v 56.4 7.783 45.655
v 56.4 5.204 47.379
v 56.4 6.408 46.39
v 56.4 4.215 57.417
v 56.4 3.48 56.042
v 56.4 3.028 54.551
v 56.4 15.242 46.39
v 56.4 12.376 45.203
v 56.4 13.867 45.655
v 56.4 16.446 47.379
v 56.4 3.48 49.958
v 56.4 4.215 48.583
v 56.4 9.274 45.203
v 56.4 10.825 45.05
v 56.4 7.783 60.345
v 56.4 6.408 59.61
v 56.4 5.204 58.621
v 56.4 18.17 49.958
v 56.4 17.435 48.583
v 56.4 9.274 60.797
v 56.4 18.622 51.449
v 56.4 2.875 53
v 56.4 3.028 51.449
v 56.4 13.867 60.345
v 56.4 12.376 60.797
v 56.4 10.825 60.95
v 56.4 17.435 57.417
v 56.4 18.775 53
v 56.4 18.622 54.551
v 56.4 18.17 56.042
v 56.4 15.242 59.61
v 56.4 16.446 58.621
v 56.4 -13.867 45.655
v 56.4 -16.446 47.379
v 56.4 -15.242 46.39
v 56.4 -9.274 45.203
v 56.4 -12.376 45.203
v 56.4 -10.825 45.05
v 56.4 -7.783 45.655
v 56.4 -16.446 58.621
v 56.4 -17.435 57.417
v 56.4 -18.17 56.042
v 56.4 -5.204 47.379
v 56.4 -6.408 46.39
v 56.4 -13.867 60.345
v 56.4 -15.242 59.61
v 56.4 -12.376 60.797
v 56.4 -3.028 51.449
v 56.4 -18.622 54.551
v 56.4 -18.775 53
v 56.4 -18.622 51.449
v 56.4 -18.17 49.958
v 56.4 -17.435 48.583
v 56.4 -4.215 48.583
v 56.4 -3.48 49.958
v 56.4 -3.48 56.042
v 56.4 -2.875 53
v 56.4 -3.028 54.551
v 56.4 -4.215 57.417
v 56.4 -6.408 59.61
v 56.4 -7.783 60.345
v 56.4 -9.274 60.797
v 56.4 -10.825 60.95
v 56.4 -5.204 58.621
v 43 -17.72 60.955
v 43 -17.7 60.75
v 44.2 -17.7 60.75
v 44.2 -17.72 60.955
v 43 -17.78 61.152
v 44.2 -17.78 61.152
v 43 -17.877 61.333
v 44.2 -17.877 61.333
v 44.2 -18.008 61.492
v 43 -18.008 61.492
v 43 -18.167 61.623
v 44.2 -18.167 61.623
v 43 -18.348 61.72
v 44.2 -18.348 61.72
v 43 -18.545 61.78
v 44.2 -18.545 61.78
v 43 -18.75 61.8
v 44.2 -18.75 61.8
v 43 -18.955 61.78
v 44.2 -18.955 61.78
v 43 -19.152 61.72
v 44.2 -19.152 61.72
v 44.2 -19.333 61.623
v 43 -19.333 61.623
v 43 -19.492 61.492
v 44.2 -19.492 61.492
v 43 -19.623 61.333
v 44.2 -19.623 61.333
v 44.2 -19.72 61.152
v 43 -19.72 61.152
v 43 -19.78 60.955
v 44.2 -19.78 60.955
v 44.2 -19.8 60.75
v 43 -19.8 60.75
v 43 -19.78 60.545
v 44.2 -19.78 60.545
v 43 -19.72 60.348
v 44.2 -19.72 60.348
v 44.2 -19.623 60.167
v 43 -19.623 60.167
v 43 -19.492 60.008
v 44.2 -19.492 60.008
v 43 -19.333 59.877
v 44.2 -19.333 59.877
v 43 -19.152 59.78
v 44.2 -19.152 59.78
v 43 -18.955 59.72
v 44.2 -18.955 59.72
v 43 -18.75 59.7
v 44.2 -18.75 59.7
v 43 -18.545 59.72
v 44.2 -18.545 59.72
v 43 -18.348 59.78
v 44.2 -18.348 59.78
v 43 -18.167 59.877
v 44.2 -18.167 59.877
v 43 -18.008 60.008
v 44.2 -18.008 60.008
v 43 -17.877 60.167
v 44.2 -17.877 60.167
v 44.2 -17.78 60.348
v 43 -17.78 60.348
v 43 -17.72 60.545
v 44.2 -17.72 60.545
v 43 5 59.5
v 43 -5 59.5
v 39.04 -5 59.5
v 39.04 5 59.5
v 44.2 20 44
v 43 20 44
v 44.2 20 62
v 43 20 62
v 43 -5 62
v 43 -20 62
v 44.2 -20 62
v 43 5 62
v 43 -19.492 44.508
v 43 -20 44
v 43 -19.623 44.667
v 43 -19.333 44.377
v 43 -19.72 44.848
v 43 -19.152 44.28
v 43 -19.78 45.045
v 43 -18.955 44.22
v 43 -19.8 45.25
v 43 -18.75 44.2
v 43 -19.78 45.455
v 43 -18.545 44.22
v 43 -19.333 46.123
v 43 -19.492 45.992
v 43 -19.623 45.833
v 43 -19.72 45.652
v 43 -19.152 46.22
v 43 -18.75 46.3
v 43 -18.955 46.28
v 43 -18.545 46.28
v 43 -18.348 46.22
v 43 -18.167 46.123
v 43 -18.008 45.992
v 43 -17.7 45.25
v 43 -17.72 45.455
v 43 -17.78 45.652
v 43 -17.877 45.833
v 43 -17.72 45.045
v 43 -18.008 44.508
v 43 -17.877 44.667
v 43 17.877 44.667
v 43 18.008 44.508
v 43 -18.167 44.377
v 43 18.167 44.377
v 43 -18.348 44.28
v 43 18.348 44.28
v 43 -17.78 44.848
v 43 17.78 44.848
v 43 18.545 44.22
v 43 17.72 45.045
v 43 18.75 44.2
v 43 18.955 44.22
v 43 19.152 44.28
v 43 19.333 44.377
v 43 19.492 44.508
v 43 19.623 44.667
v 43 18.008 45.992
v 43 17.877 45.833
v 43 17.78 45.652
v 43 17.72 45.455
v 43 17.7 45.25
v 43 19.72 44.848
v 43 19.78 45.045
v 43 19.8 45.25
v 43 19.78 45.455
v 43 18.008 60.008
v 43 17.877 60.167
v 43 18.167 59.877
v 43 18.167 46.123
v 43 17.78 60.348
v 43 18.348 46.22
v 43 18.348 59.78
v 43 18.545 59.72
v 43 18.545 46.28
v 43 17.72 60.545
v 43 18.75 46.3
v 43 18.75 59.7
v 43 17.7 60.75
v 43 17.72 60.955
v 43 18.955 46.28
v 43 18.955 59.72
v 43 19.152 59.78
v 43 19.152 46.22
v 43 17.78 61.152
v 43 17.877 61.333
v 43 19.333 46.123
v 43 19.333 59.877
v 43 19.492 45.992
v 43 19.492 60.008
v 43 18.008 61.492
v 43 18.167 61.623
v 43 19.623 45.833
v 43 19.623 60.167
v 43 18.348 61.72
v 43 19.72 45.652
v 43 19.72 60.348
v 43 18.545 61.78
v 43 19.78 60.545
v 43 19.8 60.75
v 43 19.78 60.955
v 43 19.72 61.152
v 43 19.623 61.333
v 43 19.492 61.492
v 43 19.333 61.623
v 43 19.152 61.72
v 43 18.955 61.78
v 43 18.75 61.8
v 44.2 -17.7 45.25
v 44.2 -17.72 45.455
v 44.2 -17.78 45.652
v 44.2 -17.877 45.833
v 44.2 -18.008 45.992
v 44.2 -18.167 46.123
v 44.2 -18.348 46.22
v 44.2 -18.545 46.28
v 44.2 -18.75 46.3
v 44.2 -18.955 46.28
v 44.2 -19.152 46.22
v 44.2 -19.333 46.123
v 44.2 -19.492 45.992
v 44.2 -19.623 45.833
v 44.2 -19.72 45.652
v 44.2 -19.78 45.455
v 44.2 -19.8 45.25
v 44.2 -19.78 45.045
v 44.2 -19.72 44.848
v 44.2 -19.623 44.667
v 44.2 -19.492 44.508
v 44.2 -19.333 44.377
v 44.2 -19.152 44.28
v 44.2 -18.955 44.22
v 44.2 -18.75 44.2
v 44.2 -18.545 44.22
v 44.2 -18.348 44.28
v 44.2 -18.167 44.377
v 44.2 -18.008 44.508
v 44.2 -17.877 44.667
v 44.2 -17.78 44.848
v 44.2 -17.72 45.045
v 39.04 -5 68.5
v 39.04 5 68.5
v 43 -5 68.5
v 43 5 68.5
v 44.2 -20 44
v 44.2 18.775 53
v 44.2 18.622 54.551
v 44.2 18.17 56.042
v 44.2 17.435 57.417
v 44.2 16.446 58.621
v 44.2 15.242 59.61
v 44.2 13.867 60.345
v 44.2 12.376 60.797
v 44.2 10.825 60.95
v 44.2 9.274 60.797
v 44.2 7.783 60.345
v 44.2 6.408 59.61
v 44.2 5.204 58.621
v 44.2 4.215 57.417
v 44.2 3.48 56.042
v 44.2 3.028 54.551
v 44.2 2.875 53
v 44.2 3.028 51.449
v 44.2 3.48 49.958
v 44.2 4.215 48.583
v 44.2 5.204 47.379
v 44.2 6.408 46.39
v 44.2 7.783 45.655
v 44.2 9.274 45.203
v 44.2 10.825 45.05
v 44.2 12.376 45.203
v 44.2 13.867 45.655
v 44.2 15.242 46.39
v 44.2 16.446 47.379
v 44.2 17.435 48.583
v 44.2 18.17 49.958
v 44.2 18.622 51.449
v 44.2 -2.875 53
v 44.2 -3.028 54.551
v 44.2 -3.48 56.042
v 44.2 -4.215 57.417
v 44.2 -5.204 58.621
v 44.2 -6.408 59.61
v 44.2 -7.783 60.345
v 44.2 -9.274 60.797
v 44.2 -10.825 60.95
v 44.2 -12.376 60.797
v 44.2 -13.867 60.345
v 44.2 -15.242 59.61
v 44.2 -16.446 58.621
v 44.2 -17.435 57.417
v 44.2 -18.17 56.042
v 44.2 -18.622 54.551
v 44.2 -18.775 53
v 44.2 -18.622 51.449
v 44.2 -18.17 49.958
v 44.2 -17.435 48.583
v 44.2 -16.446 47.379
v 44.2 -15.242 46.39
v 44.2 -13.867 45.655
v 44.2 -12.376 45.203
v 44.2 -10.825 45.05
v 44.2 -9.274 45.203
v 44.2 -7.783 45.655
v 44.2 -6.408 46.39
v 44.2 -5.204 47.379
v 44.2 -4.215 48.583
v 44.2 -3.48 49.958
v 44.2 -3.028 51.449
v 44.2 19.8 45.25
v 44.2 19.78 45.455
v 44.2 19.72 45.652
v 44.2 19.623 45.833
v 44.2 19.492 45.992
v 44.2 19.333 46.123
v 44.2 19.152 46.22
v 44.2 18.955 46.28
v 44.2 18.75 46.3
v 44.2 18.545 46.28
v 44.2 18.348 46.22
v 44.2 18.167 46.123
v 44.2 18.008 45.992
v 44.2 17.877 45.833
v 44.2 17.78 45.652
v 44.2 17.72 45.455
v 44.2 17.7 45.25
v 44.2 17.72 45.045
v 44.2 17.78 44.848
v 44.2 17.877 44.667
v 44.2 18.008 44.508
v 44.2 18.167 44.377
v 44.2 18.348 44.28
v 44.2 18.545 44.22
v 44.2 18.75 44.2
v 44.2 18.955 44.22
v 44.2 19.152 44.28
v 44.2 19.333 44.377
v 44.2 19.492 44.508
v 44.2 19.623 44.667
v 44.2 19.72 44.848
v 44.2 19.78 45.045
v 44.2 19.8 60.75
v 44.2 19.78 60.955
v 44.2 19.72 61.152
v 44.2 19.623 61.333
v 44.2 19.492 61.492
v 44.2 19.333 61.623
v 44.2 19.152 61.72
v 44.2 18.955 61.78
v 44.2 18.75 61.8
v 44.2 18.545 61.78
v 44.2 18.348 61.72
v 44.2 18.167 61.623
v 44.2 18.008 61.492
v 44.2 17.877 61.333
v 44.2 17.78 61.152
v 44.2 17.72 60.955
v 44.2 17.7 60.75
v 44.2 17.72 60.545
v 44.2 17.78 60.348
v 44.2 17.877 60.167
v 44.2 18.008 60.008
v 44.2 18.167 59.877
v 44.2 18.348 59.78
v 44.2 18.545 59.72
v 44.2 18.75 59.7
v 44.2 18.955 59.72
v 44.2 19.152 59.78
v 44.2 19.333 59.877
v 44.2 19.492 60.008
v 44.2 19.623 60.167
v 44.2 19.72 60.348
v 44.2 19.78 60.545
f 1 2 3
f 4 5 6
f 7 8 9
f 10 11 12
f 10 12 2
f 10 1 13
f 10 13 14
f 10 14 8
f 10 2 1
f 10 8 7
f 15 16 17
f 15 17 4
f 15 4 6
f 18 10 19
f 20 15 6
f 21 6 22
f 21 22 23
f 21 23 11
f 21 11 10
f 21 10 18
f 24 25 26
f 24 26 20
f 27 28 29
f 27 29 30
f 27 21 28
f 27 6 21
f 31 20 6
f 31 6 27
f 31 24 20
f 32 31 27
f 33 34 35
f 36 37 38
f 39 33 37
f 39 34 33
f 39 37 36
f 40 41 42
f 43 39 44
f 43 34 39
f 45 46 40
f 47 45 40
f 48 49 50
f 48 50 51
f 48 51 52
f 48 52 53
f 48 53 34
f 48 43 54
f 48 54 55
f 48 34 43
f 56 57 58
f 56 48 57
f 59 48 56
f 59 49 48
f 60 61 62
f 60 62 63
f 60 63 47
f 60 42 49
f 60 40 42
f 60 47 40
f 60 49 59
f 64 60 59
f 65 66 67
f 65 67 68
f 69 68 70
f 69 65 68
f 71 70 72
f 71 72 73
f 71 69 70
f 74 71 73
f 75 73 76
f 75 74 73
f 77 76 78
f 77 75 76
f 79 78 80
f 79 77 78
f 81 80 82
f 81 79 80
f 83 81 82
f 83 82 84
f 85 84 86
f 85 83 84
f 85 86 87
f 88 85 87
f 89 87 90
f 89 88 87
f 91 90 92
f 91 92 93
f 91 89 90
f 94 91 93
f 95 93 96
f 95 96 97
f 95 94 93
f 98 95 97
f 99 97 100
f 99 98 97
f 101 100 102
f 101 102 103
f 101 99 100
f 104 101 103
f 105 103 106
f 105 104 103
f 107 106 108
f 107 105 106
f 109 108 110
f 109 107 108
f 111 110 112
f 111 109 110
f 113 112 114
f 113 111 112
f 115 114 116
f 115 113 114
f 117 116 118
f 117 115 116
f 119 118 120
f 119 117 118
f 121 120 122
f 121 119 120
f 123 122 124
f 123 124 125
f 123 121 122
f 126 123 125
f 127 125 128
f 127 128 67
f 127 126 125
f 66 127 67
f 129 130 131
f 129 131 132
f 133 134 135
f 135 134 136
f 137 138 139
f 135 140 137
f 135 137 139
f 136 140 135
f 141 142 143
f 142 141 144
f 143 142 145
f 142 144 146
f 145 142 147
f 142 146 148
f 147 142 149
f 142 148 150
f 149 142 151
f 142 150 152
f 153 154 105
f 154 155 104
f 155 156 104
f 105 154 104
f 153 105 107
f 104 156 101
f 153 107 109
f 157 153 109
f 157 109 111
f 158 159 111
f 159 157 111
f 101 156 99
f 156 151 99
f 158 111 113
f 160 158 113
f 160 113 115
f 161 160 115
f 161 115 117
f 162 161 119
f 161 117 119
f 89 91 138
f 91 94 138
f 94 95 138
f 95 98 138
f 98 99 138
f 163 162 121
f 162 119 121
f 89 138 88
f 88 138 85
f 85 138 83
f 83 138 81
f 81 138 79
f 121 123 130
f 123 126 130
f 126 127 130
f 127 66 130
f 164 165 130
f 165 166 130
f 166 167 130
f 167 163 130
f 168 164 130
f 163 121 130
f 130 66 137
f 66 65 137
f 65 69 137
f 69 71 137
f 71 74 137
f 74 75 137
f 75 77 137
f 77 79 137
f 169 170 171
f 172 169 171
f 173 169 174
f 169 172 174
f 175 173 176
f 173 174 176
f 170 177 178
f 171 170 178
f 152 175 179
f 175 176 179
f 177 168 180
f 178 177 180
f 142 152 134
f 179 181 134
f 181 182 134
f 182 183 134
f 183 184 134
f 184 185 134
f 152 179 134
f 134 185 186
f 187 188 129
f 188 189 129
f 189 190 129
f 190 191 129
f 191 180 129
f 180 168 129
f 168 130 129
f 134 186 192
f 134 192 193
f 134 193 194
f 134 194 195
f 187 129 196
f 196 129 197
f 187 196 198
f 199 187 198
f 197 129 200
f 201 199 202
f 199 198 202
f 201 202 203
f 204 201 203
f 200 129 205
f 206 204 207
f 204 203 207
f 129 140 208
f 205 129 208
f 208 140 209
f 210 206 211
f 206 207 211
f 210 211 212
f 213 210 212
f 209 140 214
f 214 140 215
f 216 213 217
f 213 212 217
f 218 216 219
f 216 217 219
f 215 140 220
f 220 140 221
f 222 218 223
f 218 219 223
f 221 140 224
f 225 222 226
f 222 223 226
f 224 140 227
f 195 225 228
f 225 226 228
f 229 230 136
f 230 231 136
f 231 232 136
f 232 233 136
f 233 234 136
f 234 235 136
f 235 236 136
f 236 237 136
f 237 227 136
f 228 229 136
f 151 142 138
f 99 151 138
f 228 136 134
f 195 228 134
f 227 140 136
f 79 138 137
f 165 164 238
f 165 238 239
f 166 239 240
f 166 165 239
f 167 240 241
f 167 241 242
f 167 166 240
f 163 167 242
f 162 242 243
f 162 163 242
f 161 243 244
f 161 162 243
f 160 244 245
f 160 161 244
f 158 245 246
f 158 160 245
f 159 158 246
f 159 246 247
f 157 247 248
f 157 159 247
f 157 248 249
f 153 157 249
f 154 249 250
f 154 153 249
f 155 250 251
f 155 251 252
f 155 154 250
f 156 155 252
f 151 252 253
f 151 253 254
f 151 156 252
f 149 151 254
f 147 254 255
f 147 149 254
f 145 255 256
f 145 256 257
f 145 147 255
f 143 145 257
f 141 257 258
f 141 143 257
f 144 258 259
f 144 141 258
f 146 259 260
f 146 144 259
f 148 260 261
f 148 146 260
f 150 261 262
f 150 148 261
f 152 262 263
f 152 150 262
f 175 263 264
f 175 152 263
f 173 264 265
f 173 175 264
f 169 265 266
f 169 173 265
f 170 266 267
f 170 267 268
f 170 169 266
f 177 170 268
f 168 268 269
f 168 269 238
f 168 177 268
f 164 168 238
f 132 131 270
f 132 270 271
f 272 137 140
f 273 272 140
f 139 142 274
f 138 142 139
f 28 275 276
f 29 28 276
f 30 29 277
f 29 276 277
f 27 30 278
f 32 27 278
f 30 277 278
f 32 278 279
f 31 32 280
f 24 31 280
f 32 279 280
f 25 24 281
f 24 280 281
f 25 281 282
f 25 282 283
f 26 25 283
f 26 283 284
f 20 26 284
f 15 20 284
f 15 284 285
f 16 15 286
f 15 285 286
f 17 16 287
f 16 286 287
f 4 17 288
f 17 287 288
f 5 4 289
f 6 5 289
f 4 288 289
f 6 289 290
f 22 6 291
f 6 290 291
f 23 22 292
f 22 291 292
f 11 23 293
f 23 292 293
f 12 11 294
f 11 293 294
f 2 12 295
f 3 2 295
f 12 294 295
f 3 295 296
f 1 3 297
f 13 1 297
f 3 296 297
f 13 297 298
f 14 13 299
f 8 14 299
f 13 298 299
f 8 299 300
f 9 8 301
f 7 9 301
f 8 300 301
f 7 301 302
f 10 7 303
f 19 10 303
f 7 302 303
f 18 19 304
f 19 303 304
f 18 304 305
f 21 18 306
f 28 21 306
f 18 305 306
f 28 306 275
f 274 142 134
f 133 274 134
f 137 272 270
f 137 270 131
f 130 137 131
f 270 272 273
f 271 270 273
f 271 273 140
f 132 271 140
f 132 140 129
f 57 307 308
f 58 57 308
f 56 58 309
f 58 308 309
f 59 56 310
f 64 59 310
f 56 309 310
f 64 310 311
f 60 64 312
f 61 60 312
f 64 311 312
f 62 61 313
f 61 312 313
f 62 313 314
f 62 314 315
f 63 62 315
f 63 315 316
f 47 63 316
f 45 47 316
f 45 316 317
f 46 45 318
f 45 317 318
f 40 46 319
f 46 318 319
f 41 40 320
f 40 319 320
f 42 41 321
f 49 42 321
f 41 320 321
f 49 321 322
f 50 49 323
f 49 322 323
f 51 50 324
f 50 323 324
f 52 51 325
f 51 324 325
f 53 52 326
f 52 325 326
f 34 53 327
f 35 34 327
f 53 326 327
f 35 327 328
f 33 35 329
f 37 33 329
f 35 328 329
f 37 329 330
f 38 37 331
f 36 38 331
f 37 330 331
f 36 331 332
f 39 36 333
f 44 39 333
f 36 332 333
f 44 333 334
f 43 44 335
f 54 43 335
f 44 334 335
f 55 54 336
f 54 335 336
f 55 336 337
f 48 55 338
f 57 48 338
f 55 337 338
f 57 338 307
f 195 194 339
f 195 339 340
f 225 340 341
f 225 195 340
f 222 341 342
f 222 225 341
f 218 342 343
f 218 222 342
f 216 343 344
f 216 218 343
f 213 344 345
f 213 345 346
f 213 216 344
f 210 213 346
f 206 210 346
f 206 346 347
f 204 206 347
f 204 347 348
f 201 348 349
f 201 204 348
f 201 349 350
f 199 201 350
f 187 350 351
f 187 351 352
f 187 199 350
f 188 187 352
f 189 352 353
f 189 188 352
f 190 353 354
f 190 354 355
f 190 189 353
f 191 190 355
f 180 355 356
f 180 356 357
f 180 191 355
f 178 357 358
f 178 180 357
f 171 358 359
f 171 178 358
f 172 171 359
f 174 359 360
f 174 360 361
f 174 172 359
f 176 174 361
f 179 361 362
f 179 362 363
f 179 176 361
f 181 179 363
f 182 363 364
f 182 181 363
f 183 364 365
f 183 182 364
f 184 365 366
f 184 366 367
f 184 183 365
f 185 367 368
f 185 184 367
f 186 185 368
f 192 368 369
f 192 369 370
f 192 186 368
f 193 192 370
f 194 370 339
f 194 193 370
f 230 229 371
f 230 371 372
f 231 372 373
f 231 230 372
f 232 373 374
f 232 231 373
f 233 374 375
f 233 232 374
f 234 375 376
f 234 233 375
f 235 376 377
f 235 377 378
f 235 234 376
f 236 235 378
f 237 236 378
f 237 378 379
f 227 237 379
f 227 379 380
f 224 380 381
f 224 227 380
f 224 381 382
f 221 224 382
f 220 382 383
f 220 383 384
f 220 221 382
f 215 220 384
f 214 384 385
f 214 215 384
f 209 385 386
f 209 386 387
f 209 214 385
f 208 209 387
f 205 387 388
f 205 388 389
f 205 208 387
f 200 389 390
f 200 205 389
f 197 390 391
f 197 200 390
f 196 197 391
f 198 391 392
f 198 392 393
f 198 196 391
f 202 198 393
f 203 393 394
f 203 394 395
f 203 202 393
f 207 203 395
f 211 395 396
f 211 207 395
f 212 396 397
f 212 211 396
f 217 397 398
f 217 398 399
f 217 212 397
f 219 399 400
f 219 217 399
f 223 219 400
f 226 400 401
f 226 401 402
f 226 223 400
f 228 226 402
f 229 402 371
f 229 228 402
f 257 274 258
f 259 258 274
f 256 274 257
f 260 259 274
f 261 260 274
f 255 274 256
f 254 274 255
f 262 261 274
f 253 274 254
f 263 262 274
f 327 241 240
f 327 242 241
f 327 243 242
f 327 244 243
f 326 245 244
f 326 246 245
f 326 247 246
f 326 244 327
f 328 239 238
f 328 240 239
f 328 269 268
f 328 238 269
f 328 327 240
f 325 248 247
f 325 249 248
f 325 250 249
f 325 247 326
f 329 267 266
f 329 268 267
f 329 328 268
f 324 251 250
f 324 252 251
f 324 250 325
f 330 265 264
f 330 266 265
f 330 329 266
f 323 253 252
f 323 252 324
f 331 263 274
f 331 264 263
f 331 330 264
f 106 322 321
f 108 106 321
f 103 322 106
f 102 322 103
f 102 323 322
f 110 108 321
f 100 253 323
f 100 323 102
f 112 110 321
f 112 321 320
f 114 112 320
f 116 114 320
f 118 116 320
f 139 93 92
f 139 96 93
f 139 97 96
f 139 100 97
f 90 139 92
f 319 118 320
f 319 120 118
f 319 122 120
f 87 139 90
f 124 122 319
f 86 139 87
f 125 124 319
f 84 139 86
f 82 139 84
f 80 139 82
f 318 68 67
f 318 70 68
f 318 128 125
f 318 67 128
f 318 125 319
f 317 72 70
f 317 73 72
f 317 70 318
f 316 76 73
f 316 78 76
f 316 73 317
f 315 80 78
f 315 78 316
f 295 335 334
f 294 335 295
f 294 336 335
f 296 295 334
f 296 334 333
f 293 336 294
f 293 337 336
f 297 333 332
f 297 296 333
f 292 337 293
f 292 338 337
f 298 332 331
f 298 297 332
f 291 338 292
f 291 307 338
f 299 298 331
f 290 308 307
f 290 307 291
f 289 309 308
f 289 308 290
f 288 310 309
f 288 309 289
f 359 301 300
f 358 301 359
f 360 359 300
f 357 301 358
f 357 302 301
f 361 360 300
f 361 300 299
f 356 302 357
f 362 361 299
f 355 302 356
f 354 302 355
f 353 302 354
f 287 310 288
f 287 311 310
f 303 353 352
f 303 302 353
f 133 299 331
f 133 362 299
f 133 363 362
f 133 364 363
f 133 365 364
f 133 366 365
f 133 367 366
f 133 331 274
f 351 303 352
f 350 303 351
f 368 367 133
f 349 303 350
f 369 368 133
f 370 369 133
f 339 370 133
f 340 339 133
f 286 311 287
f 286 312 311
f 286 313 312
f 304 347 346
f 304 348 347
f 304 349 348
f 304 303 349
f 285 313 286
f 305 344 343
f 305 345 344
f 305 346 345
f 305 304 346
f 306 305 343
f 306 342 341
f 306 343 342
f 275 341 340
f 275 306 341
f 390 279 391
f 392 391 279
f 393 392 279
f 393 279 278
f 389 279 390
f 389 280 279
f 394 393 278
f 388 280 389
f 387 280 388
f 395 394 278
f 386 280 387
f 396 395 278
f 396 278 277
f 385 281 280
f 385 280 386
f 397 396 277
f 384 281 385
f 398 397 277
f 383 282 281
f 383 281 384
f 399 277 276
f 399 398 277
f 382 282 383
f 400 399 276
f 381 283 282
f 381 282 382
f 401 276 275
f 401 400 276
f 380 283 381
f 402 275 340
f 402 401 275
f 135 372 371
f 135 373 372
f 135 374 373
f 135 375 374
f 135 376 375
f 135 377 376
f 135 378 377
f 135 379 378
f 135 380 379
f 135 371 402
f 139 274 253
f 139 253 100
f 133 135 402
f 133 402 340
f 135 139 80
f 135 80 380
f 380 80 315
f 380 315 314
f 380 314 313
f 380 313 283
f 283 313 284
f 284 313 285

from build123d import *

# Parameters (mm, degrees)
SKETCH031_W             = 40
SKETCH031_H             = 18
SKETCH031_R             = 1.05
PAD019_DEPTH            = 1.2
SKETCH032_R             = 7.95
PAD020_DEPTH            = 12.2
SKETCH033_W             = 10
SKETCH033_H             = 9
PAD021_DEPTH            = 3.96
BODY005_PLACEMENT_ANGLE = 90


with BuildPart() as part:
    # Sketch031 → Pad019 (new body)
    with BuildSketch(Plane.XZ):
        Rectangle(SKETCH031_W, SKETCH031_H)
        with Locations((-18.75, 7.75)):
            Circle(SKETCH031_R, mode=Mode.SUBTRACT)
        with Locations((-18.75, -7.75)):
            Circle(SKETCH031_R, mode=Mode.SUBTRACT)
        with Locations((18.75, -7.75)):
            Circle(SKETCH031_R, mode=Mode.SUBTRACT)
        with Locations((18.75, 7.75)):
            Circle(SKETCH031_R, mode=Mode.SUBTRACT)
    extrude(amount=PAD019_DEPTH)

    # Sketch032 (on Face10 of Pad019) → Pad020 (join)
    with BuildSketch(Plane.XZ.offset(1.2)):
        with Locations((-10.825, 0)):
            Circle(SKETCH032_R)
        with Locations((10.825, 0)):
            Circle(SKETCH032_R)
    extrude(amount=PAD020_DEPTH)

    # Sketch033 (on Face4 of Pad020) → Pad021 (join)
    with BuildSketch(Plane(origin=(0, 0, 0), x_dir=(1, 0, 0), z_dir=(0, 1, 0))):
        with Locations((0, -11)):
            Rectangle(SKETCH033_W, SKETCH033_H)
    extrude(amount=PAD021_DEPTH)


with BuildPart() as part_1:
    # Body005 placement: moved
    add(part.part.moved(Location((43, 0, 53))).rotate(Axis((43, 0, 53), (0, 0, 1)), BODY005_PLACEMENT_ANGLE))


solid = part_1.part
